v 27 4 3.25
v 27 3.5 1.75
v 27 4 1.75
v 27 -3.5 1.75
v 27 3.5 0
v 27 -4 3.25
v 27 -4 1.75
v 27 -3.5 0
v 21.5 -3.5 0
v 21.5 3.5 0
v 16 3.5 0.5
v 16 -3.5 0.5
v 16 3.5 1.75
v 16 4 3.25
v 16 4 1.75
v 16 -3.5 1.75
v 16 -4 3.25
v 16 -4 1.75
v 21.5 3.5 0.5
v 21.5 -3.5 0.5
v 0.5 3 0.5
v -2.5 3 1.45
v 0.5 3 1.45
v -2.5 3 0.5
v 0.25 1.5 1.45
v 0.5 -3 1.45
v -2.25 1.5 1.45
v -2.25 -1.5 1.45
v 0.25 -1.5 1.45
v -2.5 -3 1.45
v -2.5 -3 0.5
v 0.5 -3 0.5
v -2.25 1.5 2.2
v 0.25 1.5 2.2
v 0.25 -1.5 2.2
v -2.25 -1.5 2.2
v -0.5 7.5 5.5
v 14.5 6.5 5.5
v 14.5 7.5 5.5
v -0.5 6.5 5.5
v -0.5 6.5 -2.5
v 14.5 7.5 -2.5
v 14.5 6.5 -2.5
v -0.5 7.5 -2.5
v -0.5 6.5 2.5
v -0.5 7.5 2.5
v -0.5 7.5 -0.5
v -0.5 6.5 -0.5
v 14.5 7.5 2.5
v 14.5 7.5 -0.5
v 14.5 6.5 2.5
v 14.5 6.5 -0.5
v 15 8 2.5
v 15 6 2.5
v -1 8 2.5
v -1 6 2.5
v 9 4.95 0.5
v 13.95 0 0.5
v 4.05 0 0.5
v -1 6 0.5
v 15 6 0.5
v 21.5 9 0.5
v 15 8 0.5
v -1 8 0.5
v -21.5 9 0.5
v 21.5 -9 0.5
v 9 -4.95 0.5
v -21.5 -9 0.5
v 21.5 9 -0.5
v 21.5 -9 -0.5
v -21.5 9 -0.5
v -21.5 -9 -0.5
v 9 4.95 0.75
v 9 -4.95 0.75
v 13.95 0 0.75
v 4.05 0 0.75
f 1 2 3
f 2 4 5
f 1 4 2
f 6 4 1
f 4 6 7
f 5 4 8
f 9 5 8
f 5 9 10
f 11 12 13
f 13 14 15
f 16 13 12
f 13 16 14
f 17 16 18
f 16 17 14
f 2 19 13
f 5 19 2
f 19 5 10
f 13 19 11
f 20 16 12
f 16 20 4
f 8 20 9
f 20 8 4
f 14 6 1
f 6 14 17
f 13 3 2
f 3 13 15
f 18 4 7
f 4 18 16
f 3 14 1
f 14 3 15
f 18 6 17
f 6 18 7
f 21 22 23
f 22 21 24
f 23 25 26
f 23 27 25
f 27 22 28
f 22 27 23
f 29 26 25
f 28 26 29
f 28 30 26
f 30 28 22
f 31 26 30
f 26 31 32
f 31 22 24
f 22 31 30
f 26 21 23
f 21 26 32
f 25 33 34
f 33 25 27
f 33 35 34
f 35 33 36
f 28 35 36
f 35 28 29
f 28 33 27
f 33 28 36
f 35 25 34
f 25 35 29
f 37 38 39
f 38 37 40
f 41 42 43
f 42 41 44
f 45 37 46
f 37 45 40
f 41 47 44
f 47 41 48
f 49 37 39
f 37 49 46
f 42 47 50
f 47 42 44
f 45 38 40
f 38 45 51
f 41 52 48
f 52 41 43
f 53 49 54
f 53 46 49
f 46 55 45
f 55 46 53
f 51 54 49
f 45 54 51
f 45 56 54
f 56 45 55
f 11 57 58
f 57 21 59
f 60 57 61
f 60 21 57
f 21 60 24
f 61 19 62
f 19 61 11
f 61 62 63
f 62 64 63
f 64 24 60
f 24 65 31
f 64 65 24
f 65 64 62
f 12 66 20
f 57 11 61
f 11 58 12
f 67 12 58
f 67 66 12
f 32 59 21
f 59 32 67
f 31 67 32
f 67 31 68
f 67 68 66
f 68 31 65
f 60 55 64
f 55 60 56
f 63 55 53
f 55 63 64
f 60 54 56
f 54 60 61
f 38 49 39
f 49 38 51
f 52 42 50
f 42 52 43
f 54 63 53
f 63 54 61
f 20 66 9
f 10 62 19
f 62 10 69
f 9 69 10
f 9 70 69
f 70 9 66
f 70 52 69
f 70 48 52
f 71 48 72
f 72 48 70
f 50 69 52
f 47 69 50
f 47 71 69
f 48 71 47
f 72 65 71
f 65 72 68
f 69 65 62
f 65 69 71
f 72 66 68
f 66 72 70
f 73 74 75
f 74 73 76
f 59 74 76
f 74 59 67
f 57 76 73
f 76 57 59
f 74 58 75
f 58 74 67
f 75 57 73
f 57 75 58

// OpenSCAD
hore = 0; //ci budu piny napajkovane smerom hore alebo dole
module doska(){
color( "MediumBlue", 1.0 )
 cube([43,18,1], true);
}

module connector(){
     cube([11,7,2], true);
     translate([0,0,1.5])
      cube([11,8,1.5], true);
}
module ATMega(){
    color( "Black", 1.0 )
     cube([7,7,0.5], true);
}
module reset(){
    color( "Silver", 1.0 )
    cube([6,3,1.5], true);
    translate([0,0,1])
    color( "White", 1.0 )
     cube([3,2.5,1], true);
}
module pin(){
   color( "Silver", 1.0 )
    cube([1,1,8], true); 
   color( "Black", 1.0 )
    cube([2,2,2], true); 
}

module celok(){
doska();
    
translate([21.5,0,1])
connector();
    
translate([9,0,0.5])
rotate([0,0,45])
ATMega();
    
translate([-1,0,0.7])
rotate([0,0,90])
reset();

for (i = [0:14])
{
    translate([i,7,1.5])
     pin();
}

}
celok();
